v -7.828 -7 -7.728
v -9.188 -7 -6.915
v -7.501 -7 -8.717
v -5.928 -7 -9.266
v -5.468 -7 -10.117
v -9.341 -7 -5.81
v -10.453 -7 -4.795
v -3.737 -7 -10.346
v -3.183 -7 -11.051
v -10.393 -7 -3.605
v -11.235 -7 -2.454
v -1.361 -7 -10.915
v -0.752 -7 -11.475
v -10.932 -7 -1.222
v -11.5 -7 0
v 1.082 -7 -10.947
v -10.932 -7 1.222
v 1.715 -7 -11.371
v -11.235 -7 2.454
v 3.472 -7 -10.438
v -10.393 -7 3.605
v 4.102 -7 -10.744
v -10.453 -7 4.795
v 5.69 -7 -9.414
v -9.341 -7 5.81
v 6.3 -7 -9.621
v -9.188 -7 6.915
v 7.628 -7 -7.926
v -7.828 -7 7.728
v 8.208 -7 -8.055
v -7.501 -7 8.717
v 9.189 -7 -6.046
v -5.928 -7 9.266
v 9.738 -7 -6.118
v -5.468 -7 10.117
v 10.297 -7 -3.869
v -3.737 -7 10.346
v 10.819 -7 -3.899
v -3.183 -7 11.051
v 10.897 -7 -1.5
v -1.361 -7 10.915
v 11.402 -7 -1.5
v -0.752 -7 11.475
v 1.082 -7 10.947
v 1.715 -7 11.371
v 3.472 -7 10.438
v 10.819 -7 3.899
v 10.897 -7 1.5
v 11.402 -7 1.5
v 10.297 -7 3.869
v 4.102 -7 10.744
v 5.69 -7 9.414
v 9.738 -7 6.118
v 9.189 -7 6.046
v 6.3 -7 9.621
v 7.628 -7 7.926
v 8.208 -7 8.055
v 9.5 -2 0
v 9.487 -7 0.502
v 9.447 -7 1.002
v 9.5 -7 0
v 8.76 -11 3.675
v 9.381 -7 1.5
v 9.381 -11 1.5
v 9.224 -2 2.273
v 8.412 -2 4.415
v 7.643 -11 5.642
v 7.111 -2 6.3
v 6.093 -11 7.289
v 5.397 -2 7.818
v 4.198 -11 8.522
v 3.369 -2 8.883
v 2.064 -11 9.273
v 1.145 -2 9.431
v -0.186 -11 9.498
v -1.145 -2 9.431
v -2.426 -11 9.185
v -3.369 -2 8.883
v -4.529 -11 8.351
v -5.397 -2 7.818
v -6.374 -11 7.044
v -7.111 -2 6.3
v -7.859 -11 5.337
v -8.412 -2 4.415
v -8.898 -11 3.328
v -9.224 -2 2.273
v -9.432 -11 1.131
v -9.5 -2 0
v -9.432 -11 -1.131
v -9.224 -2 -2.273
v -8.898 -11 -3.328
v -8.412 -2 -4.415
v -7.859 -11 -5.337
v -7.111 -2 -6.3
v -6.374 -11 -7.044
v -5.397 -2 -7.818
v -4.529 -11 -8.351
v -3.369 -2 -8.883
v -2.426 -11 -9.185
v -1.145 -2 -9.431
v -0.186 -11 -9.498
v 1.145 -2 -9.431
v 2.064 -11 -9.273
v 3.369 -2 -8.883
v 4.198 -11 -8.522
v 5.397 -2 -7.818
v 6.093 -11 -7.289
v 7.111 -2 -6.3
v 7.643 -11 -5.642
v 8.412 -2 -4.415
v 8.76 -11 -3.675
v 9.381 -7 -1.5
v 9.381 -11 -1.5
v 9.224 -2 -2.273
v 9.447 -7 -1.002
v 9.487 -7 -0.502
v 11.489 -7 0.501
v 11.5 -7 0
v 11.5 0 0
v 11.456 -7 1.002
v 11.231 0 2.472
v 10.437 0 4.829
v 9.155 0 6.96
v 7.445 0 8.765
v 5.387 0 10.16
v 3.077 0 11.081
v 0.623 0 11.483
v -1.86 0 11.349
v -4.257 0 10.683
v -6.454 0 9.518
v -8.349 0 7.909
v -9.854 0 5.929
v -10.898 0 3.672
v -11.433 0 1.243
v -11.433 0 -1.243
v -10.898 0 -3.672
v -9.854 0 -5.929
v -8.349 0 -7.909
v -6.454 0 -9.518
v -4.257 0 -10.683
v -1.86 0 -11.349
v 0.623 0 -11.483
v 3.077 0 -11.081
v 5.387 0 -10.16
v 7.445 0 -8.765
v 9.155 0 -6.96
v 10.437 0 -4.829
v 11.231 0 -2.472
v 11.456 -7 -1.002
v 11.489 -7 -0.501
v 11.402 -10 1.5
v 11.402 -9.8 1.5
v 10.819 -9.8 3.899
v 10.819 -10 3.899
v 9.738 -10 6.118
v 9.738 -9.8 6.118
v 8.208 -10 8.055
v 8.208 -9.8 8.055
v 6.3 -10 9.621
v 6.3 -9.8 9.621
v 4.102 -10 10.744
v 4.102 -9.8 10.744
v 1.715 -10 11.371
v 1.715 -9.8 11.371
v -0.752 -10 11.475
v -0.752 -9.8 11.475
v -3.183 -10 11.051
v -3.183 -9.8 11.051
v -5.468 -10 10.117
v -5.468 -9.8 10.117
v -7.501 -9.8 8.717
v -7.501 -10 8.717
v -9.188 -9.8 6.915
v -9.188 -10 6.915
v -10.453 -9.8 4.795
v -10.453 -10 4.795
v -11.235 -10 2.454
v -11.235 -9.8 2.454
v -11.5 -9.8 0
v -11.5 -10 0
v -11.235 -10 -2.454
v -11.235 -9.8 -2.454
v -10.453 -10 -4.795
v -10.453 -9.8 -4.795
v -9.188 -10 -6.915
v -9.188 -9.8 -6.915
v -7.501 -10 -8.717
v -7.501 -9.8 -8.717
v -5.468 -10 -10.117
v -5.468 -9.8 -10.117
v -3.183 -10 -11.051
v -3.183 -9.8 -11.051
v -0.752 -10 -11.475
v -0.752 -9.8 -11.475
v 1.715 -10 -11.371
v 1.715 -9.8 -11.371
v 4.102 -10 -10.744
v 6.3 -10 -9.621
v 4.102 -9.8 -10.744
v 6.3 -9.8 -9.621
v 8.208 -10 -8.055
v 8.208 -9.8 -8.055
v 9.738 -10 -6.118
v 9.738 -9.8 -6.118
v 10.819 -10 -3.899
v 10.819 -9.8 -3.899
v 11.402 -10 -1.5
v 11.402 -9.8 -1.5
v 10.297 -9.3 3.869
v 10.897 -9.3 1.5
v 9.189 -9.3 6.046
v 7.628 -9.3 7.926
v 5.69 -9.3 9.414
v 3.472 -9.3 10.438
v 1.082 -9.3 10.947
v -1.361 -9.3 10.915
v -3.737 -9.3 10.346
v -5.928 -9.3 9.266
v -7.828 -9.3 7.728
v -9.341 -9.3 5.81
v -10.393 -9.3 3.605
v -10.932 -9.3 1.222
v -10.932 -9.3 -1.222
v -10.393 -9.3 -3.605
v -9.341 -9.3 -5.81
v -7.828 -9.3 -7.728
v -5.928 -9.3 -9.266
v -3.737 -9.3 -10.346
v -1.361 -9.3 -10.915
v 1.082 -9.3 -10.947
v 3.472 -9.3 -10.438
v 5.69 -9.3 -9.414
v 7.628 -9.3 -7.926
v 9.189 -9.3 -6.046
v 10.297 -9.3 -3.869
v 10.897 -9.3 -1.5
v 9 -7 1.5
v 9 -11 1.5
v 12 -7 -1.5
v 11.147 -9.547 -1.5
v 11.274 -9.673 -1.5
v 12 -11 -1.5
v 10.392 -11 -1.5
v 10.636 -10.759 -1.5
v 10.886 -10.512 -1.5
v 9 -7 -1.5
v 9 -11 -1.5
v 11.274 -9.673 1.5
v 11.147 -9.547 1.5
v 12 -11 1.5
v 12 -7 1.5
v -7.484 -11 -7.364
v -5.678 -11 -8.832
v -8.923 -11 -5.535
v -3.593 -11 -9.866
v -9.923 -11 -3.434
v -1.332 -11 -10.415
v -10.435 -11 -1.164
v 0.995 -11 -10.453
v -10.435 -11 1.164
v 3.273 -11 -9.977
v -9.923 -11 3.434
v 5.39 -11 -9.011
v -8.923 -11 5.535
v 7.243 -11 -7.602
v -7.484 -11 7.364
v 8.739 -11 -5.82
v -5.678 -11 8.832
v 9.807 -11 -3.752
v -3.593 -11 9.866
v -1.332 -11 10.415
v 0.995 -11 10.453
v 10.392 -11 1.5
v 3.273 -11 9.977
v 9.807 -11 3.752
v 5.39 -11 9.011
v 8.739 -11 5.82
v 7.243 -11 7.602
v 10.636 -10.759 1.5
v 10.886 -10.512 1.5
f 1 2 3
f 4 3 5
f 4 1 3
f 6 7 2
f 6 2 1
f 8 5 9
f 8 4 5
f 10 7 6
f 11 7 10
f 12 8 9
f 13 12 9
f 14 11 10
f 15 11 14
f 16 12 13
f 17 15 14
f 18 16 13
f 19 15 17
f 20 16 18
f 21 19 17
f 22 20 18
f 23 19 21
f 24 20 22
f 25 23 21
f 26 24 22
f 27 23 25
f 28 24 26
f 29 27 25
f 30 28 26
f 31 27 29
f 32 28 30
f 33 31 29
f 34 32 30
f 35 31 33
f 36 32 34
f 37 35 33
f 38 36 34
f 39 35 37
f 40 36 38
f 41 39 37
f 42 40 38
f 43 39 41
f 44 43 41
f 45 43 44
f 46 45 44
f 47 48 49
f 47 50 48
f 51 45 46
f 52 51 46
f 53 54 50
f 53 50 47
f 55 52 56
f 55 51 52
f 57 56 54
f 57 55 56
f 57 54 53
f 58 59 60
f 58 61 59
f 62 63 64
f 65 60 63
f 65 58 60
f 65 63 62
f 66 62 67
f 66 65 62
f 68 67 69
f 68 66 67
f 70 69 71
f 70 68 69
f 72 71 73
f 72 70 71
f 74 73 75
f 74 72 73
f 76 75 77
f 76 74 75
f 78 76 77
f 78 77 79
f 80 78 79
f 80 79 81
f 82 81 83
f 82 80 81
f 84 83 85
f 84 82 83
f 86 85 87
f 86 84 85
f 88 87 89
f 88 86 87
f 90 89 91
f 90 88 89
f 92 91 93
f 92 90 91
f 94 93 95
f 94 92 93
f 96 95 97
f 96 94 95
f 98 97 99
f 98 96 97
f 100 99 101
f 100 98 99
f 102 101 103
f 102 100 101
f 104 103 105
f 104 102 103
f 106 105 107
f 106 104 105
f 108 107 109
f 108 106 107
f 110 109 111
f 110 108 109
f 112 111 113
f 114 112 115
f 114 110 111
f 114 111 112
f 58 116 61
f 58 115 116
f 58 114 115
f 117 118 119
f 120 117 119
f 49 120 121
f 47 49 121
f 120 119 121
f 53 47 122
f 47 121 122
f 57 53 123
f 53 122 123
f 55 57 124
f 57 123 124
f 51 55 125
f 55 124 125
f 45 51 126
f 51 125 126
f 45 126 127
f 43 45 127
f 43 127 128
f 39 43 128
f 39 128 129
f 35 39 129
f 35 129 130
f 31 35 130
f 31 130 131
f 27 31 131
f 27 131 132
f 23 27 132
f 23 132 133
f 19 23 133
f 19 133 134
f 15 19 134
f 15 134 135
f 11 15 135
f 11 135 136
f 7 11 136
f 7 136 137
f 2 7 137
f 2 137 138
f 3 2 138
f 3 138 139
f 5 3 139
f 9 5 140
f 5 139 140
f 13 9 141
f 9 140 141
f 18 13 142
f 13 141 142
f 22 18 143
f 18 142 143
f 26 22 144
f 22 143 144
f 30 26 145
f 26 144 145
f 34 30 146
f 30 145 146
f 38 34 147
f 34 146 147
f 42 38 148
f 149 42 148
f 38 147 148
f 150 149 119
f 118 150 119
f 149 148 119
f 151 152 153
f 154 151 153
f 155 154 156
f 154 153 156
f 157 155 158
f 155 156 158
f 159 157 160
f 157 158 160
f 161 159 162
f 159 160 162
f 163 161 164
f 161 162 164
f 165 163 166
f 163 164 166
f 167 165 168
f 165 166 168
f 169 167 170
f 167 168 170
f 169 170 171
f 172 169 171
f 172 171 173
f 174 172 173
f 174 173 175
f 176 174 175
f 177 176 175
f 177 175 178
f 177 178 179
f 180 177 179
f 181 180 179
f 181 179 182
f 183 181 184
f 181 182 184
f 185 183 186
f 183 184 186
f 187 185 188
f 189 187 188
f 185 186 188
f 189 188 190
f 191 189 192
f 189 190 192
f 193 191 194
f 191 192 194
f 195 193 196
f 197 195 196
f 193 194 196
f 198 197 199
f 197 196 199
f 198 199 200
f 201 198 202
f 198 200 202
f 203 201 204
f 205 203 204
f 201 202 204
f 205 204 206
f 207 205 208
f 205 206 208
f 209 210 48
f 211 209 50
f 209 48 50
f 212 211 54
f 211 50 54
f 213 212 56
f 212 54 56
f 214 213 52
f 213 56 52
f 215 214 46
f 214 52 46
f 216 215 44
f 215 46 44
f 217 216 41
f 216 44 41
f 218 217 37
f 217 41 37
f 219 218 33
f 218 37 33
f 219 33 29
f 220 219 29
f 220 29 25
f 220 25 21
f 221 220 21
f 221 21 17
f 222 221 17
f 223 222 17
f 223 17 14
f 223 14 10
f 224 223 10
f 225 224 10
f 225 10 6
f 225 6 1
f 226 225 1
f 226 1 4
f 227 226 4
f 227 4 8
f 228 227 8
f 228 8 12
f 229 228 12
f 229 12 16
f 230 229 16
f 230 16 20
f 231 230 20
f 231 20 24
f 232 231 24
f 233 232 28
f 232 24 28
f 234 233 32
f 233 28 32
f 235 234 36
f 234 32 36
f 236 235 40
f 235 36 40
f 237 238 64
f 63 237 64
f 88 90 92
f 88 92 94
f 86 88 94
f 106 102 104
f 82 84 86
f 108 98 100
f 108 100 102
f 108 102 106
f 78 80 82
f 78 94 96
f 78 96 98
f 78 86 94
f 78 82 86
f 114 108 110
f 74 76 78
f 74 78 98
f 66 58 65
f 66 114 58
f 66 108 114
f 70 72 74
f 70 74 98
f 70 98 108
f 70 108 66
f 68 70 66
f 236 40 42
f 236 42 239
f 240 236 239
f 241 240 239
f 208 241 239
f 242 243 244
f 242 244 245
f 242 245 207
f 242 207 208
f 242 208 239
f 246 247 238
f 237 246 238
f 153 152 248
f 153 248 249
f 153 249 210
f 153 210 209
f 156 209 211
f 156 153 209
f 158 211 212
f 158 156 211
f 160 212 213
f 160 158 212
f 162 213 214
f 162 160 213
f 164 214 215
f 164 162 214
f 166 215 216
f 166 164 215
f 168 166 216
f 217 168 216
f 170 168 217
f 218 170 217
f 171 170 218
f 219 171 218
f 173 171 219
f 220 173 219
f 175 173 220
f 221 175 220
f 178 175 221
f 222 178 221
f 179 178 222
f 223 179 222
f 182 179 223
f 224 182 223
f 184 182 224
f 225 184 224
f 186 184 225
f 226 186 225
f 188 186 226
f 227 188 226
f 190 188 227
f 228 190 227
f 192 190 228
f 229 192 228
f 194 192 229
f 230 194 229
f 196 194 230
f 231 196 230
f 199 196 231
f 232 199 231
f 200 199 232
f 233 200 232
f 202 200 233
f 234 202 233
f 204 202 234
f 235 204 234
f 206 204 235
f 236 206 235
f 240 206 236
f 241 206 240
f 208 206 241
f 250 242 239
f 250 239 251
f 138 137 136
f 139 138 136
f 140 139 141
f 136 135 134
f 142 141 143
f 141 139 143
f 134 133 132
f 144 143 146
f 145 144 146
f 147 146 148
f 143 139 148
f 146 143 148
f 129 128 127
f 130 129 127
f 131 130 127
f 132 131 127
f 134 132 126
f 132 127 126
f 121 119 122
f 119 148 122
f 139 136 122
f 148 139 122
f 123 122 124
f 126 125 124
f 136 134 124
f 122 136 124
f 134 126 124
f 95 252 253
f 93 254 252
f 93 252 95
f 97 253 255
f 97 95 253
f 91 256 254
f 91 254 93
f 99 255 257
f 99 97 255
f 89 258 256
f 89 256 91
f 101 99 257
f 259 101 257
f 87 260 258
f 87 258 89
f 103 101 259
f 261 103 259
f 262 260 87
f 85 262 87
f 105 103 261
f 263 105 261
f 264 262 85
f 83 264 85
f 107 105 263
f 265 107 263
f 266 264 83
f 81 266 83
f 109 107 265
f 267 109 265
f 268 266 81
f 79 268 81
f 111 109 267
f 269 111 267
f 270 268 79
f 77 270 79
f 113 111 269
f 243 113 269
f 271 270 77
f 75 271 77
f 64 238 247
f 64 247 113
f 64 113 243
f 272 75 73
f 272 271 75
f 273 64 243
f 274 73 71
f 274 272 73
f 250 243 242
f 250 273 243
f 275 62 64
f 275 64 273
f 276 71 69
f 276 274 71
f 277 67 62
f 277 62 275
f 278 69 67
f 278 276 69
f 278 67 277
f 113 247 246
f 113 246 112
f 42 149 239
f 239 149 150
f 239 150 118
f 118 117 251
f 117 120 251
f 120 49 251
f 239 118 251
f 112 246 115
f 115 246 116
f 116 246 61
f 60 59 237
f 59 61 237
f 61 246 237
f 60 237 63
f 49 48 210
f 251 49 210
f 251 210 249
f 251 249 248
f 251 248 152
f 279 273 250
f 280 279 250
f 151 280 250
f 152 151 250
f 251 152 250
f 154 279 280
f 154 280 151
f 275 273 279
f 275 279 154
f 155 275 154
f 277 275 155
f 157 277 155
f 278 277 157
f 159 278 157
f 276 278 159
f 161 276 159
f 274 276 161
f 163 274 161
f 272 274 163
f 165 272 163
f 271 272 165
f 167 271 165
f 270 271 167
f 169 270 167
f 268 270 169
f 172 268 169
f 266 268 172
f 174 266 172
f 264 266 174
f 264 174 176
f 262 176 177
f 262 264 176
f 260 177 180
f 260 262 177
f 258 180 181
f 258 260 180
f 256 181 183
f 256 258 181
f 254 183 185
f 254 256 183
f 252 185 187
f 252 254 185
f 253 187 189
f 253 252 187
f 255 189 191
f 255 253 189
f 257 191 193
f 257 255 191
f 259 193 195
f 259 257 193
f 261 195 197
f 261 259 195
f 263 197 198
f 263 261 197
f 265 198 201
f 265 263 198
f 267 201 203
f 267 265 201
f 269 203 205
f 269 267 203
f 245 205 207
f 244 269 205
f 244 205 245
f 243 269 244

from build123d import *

# Parameters (mm, degrees)
F0_R        = 11.5
F0_R_2      = 9.5
F1_DEPTH    = 7
F2_DEPTH    = 2
F3_R        = 11
F3_R_2      = 9.5
F4_DEPTH    = 2
F5_R        = 11.5
F5_R_2      = 11
F5_R_3      = 9.5
F6_DEPTH    = 2
F7_S5_R     = 11
F7_T6_DEPTH = 18
F8_SIZE     = 1
F9_W        = 3
F9_H        = 3
F10_DEPTH   = 4


# Not quite as in the source:
# - a fillet or chamfer that OpenCascade refuses, or shapes differently, is made with other operations: its cross-section is extruded or revolved along the edge and cut away or added


with BuildPart() as f1:
    # F0 (on Front) → F1 (new body)
    with BuildSketch(Plane.XZ):
        Circle(F0_R)
        Circle(F0_R_2, mode=Mode.SUBTRACT)
    extrude(amount=F1_DEPTH)

    # F0 (on Front) → F2 (join)
    with BuildSketch(Plane.XZ):
        Circle(F0_R_2)
    extrude(amount=F2_DEPTH)

    # F3 (on face) → F4 (join)
    with BuildSketch(Plane.XZ.offset(7)):
        Circle(F3_R)
        Circle(F3_R_2, mode=Mode.SUBTRACT)
    extrude(amount=F4_DEPTH)

    # F5 (on face) → F6 (join)
    with BuildSketch(Plane.XZ.offset(9)):
        Circle(F5_R)
        Circle(F5_R_2, mode=Mode.SUBTRACT)
        Circle(F5_R_2)
        Circle(F5_R_3, mode=Mode.SUBTRACT)
    extrude(amount=F6_DEPTH)

    # F7: chamfer of 0.8 on 1 edges, made by hand


with BuildPart() as f7_tool2:
    # F7_s3 → F7_t4 (revolve)
    with BuildSketch(Plane.XY):
        Polygon((10.7, -9), (11.5, -9.8), (11.5, -9), align=None)
    revolve(axis=Axis((0, -9, 0), (0, -1, 0)))

    # F7_s5 → F7_t6 (cut, symmetric)
    with BuildSketch(Plane.XZ.offset(9.4)):
        Circle(F7_S5_R)
    extrude(amount=F7_T6_DEPTH, both=True, mode=Mode.SUBTRACT)


with BuildPart() as f1_1:
    add(f1.part)

    # F7_t1: cut F7_tool2
    add(f7_tool2.part, mode=Mode.SUBTRACT)

    # F8
    f8_edges = [f1_1.edges().sort_by_distance(p)[0] for p in [
        (-11.5, -11, 0),
    ]]
    chamfer(f8_edges, length=F8_SIZE)

    # F9 (on face) → F10 (join)
    with BuildSketch(Plane.XZ.offset(11)):
        with Locations((10.5, 0)):
            Rectangle(F9_W, F9_H)
    extrude(amount=-F10_DEPTH)


solid = f1_1.part
